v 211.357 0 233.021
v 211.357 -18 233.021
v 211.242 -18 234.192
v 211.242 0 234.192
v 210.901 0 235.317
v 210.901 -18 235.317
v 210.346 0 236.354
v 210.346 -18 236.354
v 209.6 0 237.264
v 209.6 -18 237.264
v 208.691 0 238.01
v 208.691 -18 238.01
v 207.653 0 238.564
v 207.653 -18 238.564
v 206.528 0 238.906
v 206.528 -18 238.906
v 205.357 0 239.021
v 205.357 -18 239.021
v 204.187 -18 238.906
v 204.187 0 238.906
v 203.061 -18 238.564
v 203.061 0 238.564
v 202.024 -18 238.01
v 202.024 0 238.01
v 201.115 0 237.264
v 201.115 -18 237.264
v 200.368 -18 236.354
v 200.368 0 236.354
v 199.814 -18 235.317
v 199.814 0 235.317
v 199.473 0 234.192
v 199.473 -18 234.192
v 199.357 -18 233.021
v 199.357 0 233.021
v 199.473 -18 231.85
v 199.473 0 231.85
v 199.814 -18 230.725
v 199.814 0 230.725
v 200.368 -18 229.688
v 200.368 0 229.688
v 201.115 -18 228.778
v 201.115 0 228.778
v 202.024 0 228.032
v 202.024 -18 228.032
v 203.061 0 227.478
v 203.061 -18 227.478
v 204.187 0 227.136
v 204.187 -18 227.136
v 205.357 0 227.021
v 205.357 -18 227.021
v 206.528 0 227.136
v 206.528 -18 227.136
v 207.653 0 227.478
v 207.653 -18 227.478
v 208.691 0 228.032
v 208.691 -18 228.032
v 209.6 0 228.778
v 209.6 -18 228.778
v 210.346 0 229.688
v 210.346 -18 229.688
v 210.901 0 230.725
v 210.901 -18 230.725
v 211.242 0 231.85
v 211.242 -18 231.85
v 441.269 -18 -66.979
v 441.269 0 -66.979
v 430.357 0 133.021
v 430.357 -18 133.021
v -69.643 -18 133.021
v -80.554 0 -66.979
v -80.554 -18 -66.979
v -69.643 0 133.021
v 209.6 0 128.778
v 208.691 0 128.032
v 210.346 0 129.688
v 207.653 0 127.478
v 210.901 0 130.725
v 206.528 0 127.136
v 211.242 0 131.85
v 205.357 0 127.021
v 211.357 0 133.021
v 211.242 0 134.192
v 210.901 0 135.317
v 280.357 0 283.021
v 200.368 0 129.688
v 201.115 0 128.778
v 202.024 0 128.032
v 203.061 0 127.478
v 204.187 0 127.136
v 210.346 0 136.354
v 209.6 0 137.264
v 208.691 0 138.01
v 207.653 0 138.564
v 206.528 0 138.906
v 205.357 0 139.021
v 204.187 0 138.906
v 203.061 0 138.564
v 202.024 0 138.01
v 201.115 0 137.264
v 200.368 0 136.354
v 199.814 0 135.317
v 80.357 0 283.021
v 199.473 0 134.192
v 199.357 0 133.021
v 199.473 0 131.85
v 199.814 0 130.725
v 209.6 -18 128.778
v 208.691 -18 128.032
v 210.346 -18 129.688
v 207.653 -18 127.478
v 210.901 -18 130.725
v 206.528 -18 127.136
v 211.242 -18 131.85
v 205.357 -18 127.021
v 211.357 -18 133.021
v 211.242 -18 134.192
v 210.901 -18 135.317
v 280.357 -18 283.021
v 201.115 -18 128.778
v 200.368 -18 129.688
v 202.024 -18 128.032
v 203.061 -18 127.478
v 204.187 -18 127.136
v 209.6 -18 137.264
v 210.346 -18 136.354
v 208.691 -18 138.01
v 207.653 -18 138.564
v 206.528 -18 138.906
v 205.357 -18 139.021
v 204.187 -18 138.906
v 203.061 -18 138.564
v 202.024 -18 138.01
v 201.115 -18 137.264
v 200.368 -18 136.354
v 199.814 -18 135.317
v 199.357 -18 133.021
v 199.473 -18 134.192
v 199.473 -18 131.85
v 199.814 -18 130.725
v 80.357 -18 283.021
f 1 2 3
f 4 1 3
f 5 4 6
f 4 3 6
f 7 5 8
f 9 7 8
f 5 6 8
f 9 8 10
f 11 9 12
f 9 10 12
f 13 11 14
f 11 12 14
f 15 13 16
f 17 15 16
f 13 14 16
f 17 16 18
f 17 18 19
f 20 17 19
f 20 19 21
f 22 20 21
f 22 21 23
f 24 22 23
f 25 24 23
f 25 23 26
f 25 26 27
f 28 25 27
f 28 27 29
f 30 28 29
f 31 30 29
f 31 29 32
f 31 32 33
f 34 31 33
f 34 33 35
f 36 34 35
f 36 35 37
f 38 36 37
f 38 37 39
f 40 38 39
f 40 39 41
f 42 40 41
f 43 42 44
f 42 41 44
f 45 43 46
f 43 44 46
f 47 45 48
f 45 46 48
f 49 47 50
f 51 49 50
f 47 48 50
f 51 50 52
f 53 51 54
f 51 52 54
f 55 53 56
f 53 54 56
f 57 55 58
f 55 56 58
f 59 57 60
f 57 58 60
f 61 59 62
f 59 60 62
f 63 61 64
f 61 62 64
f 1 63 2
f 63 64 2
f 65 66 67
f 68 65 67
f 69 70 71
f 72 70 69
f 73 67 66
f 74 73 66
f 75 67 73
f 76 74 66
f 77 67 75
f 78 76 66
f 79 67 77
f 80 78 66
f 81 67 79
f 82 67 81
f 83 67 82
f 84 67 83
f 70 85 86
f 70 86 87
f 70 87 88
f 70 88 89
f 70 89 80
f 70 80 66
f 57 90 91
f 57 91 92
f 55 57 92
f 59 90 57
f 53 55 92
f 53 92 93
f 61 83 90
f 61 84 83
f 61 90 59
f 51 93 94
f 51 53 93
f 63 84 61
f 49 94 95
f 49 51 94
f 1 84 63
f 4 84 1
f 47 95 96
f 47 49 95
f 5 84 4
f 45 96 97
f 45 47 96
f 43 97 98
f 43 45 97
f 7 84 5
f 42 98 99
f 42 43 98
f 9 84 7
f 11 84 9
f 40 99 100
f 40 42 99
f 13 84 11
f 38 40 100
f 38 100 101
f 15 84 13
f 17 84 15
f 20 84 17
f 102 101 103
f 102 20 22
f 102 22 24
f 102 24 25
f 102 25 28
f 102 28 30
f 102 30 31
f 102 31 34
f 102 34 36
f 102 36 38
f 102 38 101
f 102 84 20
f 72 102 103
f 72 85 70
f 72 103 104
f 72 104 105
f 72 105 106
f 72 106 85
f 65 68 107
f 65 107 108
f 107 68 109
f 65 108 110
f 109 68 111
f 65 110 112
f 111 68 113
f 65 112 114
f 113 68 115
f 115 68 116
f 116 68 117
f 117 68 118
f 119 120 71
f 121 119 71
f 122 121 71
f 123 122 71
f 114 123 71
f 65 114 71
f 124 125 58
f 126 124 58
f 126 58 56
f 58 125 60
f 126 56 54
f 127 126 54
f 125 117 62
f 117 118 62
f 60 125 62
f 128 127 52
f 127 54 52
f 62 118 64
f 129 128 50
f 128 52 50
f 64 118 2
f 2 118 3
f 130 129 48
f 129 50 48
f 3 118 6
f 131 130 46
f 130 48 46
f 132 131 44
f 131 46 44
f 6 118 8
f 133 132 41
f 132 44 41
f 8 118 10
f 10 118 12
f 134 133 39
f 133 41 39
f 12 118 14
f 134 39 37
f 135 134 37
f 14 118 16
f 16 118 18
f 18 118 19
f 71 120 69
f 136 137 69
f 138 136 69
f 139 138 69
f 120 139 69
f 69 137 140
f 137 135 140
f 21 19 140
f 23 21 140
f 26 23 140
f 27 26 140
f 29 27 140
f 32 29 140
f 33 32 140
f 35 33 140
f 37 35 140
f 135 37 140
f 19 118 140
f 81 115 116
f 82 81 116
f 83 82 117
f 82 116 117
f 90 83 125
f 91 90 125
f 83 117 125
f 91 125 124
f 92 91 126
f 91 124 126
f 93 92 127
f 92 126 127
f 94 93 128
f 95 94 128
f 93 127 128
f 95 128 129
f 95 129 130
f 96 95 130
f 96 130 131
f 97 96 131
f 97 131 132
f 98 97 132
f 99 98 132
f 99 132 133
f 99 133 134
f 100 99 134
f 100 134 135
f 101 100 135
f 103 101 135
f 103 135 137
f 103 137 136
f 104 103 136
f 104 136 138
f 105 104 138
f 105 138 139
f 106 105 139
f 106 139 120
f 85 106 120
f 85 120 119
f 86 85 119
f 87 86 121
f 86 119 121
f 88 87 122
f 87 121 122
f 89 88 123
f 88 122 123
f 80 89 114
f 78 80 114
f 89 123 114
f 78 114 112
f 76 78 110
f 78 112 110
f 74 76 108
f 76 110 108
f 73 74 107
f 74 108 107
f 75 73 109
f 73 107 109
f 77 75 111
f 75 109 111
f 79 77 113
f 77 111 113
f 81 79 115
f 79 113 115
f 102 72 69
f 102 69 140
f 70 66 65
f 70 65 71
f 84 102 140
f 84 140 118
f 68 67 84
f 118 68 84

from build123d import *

# Parameters (mm, degrees)
F1_DEPTH = 18
F3_R     = 6
F4_DEPTH = 25


with BuildPart() as f1:
    # F0 (on Front) → F1 (new body)
    with BuildSketch(Plane.XZ):
        Polygon((180.357315, 283.020994), (180.357315, -66.979006), (441.269071, -66.979006), (430.357315, 133.020994), (280.357315, 283.020994), align=None)
    extrude(amount=F1_DEPTH)

    # F2: F1 across face


with BuildPart() as f1_1:
    add(f1.part)
    add(f1.part.mirror(Plane(origin=(180.357315, -9, 108.020994), x_dir=(0, -1, 0), z_dir=(-1, 0, 0))))

    # F3 (on face) → F4 (cut)
    with BuildSketch(Plane.XZ.offset(18)):
        with Locations((205.357315, 233.020994)):
            Circle(F3_R)
        with Locations((205.357315, 133.020994)):
            Circle(F3_R)
    extrude(amount=-F4_DEPTH, mode=Mode.SUBTRACT)


solid = f1_1.part
